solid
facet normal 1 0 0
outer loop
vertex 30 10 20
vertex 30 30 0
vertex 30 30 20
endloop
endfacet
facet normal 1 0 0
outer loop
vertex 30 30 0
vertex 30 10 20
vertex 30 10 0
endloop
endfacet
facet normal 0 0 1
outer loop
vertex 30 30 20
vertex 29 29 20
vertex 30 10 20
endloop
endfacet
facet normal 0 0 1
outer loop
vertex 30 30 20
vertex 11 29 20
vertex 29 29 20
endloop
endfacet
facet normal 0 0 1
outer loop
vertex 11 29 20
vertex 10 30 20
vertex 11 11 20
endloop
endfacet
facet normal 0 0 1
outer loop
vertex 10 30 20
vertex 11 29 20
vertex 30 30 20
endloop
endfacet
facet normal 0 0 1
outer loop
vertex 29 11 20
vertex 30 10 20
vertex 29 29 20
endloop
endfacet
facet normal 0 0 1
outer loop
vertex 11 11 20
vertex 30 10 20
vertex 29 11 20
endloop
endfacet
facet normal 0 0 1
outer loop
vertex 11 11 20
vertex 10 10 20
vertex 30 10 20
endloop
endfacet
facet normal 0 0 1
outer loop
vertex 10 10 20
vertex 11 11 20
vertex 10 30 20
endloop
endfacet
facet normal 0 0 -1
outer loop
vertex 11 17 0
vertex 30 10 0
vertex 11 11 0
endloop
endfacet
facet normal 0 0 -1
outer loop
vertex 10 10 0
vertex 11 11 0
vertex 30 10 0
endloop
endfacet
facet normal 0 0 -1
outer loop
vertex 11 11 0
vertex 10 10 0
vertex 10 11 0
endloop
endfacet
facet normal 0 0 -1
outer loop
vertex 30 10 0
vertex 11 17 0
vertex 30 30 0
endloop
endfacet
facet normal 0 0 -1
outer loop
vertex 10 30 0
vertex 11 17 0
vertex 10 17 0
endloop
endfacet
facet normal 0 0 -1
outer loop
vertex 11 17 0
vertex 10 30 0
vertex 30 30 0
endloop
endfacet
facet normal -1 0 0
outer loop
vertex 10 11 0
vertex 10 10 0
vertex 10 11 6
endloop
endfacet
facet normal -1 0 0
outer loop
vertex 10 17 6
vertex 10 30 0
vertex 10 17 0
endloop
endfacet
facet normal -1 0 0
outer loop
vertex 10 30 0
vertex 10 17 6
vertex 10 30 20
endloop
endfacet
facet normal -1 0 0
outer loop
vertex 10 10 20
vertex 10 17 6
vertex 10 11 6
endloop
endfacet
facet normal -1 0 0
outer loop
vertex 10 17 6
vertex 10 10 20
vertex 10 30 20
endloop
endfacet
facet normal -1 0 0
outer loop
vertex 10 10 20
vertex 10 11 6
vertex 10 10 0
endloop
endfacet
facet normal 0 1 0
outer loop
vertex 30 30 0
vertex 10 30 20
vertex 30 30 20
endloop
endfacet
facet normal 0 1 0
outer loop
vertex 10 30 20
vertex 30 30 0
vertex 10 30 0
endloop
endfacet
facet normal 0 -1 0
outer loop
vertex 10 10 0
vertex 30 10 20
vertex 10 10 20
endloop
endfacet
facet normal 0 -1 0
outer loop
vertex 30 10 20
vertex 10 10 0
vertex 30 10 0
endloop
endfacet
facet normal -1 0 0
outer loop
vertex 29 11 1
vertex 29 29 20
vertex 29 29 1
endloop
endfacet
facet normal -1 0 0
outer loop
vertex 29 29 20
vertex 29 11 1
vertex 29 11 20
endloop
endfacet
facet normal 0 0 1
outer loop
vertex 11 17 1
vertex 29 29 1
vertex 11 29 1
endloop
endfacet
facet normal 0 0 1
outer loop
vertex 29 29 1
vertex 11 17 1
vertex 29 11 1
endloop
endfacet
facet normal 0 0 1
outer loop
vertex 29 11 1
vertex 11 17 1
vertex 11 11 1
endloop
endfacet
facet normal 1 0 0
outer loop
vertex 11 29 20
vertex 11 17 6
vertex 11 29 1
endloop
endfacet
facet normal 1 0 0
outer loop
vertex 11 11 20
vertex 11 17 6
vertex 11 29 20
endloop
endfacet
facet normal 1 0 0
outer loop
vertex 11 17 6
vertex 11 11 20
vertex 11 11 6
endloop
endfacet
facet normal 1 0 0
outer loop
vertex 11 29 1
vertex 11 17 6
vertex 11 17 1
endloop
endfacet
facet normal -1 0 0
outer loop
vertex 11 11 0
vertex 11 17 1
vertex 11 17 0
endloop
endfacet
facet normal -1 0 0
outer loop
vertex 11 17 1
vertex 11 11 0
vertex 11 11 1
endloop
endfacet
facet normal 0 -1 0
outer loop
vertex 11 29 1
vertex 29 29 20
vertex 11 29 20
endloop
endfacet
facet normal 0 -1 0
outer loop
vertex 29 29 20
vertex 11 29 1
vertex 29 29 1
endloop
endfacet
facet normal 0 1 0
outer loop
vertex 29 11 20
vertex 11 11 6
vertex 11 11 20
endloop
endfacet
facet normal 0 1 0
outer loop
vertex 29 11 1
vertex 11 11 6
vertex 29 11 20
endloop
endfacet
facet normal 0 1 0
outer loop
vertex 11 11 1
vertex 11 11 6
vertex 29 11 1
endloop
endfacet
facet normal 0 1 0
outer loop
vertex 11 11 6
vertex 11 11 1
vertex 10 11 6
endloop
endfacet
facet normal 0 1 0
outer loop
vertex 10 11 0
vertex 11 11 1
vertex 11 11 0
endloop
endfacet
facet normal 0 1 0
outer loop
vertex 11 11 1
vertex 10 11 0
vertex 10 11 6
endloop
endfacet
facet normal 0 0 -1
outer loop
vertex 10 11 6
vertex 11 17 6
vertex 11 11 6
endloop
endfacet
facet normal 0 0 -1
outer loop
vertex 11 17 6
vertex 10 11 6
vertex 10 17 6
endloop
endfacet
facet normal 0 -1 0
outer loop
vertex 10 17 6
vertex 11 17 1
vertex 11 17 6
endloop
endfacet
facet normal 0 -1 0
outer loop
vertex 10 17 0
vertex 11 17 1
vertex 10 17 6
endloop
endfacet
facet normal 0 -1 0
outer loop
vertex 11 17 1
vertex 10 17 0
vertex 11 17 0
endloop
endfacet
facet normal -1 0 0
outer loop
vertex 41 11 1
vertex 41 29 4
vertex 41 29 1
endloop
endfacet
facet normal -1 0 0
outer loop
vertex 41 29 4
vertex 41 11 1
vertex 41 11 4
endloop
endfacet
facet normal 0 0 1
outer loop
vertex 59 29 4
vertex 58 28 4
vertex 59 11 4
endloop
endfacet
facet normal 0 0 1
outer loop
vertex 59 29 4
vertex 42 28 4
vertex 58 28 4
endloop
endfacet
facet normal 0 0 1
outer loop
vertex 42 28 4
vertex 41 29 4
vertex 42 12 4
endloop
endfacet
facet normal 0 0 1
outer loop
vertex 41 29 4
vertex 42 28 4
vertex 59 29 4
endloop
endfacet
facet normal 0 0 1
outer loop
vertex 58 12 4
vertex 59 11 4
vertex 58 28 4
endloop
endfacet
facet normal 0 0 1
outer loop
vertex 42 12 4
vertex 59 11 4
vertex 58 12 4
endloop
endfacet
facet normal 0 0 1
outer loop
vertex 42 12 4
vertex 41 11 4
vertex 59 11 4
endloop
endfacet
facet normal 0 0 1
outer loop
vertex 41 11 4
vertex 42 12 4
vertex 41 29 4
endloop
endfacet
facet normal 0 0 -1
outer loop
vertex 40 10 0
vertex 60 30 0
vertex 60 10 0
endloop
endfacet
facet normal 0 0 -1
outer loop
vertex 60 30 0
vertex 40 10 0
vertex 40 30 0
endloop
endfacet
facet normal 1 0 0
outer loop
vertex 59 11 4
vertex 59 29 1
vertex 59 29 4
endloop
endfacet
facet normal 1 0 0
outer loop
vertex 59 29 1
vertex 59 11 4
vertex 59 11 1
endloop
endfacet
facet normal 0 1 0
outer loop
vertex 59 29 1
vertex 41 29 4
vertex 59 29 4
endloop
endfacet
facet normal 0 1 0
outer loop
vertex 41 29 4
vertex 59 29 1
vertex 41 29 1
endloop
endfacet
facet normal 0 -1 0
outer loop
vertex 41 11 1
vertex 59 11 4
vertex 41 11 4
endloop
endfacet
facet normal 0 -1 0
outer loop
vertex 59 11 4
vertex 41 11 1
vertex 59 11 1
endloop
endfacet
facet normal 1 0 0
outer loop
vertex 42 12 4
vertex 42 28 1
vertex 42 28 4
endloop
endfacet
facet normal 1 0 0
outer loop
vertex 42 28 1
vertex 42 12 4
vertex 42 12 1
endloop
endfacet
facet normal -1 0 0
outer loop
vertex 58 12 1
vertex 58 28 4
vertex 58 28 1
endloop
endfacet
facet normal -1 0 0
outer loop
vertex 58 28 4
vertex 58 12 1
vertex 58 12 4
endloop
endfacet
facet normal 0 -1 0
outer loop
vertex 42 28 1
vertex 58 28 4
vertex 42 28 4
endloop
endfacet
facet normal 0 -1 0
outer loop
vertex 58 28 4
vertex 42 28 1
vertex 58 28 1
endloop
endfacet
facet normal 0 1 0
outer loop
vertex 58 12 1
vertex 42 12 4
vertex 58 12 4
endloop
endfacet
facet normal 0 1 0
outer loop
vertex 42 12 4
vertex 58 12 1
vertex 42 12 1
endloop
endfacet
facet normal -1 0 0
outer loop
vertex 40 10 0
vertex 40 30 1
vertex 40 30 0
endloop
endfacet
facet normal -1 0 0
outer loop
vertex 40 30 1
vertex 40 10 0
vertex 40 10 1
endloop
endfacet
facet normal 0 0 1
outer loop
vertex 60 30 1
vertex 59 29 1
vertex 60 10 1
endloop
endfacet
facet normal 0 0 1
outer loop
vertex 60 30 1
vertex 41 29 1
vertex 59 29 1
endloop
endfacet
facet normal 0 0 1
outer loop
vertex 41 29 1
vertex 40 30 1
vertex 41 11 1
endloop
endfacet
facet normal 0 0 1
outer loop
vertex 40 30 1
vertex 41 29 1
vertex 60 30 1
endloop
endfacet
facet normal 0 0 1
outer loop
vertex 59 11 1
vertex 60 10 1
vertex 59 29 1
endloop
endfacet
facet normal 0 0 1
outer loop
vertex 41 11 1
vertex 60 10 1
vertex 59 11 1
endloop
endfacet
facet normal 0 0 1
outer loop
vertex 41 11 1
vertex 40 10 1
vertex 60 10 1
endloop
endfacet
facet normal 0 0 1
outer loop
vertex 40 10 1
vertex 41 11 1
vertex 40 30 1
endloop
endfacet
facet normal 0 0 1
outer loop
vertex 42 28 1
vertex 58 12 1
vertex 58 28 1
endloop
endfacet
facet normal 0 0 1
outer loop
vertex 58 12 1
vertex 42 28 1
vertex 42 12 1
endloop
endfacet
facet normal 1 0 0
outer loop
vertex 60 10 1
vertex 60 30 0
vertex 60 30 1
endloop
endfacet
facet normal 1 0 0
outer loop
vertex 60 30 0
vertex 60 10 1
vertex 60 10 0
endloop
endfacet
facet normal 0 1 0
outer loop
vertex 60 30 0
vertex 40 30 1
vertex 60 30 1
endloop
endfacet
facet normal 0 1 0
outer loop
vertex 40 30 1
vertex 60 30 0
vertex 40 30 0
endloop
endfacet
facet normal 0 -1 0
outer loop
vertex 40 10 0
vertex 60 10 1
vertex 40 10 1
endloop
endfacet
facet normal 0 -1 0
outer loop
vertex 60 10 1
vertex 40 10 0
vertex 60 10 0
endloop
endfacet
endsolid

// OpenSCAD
$fn=200;

length = 20;
width= 20;
height = 20;
cornerRadius = 10;

translate([10, 10, 0]){
    difference() {
            roundedBox(length, width, height, cornerRadius); 
            translate([1,1,1]) {
                roundedBox(length-2, width-2, height-1, cornerRadius); 
            }
           translate([0,,1]) {
                roundedBox(6,1,6, cornerRadius); 
            }
    }
}

translate([width*3, 10, 0]){
    mirror([1,0,0]) {
        roundedBox(length, width, 1, cornerRadius);
        difference() {
            translate([1,1,0]) {
                roundedBox(length-2,width-2,4,cornerRadius);
            }
            translate([2,2,0]) {
                roundedBox(length-4,width-4,4,cornerRadius);
            }    
        }
    }
}



module roundedBox(length, width, height, radius)
{
    dRadius = 2*radius;




    //base rounded shape

        cube(size=[width,length, height]);
  
    
  
}
